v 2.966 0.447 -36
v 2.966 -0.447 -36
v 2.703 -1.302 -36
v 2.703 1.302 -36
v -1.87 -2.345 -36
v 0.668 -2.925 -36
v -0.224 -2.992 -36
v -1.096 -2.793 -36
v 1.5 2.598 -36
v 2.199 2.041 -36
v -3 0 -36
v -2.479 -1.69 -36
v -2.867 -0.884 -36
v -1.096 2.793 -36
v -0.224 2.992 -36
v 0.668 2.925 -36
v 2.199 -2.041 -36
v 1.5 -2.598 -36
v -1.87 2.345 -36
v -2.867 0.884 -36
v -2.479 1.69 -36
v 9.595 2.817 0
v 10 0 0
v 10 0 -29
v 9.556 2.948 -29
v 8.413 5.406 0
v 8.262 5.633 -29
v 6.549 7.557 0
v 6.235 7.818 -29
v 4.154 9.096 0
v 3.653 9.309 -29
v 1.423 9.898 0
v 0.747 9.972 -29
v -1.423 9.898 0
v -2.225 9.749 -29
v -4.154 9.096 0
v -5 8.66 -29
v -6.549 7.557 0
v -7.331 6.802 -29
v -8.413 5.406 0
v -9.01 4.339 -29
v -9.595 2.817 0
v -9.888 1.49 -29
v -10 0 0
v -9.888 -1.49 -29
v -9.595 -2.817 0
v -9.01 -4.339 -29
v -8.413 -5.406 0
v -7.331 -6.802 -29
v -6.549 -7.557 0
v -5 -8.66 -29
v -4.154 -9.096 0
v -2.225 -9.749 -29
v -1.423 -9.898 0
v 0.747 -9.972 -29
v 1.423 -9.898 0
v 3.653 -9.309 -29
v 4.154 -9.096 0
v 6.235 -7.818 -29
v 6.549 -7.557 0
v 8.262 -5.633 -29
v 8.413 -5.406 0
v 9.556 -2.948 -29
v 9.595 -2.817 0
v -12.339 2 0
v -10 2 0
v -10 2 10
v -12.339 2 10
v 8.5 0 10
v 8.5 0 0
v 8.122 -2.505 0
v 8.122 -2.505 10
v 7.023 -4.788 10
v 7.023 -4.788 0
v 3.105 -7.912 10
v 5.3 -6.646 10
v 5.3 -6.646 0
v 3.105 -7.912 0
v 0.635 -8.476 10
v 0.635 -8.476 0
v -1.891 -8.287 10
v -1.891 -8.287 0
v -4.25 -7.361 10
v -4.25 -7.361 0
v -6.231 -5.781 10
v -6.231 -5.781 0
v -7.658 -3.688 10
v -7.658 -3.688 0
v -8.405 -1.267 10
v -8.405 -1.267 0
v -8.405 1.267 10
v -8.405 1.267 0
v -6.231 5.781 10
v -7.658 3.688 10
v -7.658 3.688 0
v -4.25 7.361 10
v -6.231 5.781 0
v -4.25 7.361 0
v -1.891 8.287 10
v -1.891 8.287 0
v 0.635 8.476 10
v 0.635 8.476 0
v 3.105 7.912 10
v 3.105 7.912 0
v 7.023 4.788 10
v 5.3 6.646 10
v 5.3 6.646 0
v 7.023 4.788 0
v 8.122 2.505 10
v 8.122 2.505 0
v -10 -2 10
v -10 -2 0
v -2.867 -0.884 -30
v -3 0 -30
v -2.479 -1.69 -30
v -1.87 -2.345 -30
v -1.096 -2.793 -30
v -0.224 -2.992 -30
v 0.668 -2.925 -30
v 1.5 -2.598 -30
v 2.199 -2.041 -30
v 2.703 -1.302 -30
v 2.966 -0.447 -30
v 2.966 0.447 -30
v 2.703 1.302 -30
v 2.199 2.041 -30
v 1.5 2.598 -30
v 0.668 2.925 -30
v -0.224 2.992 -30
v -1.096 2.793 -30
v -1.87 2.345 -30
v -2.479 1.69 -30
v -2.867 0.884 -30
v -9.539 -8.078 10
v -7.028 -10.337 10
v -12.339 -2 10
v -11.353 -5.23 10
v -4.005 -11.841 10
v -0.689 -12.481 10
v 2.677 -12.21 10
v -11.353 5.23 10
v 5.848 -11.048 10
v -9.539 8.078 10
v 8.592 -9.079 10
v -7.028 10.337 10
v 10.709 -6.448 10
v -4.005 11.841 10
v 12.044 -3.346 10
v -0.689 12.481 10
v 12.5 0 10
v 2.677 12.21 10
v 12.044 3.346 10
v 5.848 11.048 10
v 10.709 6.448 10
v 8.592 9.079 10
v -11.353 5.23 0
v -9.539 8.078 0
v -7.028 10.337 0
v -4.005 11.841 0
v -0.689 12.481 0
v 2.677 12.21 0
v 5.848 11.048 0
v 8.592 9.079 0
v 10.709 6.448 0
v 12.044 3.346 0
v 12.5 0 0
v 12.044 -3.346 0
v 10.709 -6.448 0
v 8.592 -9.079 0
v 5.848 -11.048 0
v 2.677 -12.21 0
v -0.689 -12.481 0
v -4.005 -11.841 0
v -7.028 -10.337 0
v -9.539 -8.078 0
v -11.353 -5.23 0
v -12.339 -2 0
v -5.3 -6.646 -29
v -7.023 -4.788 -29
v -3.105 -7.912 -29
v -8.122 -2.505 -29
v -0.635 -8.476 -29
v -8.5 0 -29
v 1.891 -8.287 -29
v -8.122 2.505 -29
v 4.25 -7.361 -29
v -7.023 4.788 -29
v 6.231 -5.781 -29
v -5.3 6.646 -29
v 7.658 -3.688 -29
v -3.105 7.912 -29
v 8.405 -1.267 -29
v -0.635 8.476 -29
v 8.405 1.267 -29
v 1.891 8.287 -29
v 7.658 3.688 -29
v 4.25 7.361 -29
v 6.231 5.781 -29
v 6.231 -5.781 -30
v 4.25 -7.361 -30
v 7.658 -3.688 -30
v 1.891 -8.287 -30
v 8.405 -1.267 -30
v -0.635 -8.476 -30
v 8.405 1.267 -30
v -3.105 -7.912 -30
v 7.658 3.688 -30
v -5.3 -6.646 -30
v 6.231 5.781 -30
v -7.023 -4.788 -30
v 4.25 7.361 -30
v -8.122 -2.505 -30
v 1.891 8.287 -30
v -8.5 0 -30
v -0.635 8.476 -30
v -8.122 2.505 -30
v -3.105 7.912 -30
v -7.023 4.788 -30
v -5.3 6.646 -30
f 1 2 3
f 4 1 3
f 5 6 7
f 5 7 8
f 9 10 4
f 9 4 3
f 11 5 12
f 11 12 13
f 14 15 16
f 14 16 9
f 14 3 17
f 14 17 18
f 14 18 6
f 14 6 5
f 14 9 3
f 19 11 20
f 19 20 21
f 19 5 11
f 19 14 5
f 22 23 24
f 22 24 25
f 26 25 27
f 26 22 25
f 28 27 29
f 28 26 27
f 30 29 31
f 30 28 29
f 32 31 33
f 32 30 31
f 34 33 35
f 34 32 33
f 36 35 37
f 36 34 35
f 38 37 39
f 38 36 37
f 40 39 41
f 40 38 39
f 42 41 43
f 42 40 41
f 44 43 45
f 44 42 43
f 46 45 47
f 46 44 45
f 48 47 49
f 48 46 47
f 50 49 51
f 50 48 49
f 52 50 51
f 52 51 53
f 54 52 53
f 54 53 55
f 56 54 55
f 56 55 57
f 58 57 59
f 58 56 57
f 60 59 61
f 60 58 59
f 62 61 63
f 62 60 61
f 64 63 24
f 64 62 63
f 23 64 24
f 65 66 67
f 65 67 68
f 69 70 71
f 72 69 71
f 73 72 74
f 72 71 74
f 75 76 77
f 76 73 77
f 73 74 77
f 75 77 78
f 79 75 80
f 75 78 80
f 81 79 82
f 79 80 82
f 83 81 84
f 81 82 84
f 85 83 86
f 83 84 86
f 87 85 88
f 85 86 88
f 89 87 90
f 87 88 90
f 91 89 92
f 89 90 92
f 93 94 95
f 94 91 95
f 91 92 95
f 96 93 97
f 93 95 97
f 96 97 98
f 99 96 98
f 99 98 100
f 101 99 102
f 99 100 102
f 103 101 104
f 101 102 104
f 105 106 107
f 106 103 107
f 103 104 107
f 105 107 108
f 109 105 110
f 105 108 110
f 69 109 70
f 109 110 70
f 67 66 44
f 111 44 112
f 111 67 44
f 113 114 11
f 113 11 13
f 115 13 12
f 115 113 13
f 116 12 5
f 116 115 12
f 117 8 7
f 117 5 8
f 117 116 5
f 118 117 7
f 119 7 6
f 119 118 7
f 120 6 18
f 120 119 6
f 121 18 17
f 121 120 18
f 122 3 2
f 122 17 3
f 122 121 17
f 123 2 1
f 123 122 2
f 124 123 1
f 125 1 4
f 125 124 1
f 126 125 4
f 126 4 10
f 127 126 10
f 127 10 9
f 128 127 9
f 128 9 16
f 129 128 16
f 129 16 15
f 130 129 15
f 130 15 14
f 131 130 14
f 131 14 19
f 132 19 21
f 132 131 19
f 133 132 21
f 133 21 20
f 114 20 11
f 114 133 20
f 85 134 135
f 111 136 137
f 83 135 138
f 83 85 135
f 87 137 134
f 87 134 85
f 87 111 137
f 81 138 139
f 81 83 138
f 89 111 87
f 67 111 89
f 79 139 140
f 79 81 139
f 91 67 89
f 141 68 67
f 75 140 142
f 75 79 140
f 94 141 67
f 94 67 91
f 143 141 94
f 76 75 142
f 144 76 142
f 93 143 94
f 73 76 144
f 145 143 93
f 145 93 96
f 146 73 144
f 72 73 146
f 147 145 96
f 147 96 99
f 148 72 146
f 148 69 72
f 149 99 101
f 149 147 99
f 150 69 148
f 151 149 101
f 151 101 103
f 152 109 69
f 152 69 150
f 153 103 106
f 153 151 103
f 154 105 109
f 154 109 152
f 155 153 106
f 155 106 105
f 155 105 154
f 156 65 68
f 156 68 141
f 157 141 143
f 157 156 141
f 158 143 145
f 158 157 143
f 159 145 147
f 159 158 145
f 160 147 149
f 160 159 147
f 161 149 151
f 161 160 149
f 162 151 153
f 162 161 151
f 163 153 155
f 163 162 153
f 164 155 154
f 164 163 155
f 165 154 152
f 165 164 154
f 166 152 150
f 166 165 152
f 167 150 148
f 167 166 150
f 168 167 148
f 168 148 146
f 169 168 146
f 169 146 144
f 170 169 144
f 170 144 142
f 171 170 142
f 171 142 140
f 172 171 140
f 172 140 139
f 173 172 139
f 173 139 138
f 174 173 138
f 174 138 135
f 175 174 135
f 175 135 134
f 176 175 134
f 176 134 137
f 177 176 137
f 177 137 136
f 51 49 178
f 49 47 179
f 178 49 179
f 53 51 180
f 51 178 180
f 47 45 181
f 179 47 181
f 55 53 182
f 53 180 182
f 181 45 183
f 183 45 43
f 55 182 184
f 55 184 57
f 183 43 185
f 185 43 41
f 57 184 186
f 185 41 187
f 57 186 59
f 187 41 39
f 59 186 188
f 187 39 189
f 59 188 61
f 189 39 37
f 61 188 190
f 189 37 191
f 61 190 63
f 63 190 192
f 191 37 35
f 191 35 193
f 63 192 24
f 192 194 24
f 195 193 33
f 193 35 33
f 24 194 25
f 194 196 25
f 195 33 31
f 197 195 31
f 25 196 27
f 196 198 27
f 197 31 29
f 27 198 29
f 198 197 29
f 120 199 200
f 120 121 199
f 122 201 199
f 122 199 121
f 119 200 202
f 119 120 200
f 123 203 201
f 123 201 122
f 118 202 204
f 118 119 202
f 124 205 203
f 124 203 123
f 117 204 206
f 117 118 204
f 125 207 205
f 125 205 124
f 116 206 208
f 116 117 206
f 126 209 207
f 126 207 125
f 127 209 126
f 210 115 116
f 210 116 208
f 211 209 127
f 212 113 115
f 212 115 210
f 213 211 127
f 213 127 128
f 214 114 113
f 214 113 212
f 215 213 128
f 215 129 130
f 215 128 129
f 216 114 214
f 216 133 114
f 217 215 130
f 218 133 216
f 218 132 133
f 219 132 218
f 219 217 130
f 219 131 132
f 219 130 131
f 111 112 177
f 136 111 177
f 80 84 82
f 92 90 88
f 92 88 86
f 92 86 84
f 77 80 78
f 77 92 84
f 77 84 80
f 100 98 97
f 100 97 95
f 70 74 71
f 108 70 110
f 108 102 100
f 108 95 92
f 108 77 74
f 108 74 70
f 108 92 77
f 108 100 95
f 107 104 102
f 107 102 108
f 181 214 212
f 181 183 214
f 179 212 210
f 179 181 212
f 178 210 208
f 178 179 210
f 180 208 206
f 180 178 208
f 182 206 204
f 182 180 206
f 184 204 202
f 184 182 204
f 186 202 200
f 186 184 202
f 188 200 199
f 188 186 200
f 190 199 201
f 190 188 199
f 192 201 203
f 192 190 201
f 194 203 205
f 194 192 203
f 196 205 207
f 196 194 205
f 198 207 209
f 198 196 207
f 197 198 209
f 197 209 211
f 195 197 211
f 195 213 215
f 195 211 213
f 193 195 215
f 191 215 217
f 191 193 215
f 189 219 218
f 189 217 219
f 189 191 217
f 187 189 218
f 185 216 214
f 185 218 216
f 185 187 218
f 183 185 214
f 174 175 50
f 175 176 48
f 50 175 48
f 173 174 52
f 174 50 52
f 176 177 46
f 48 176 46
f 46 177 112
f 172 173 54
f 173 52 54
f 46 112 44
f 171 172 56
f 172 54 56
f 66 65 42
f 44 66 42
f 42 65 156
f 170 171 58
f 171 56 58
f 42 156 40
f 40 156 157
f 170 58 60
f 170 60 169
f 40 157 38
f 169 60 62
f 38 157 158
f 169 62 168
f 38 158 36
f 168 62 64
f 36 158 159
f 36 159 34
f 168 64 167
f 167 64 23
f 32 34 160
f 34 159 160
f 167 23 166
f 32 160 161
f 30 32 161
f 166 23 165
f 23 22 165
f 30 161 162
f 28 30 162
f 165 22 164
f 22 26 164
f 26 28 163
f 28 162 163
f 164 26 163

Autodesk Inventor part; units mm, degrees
ref_plane "YZ Plane" through (0, 0, 0) normal (1, 0, 0) x (0, 1, 0)
ref_plane "XZ Plane" through (0, 0, 0) normal (0, 1, 0) x (-1, 0, 0)
ref_plane "XY Plane" through (0, 0, 0) normal (0, 0, 1) x (1, 0, 0)
sketch "Sketch1" plane through (0, 0, 0) normal (0, 0, 1) x (1, 0, 0)
  circle A0 centre (0, 0) radius 10
  circle A1 centre (0, 0) radius 12.5
  dimension "d0" = 0
  dimension "d1" = 0
  dimension "d2" = 0
  dimension "d3" = 0
  dimension "d4" = 25
  dimension "d5" = 20
extrude "Extrusion1" add sketch "Sketch1" along normal blind 10
extrude "Extrusion2" add sketch "Sketch1" against normal blind 29 contours A0
sketch "Sketch2" plane through (0, 0, -29) normal (0, 0, -1) x (-1, 0, 0)
  circle A0 centre (0, 0) radius 8.5
  dimension "d10" = 17
extrude "Extrusion3" add sketch "Sketch2" along normal blind 1
sketch "Sketch3" plane through (0, 0, -30) normal (0, 0, -1) x (-1, 0, 0)
  circle A0 centre (0, 0) radius 3
  dimension "d13" = 6
extrude "Extrusion4" add sketch "Sketch3" along normal blind 6
thread "Thread1" size "M6x1" class "6g" standard "ANSI Metric M Profile" full length
sketch "Sketch4" plane through (0, 0, 10) normal (0, 0, 1) x (1, 0, 0)
  circle A0 centre (0, 0) radius 10 projected
  line L0 (-10, 0) -> (-10, 2)
  line L1 (-10, 2) -> (-12.8956, 2)
  line L2 (-10, 0) -> (-11.1456, 0)
  line L3 (-10, 0) -> (-10, -2)
  line L4 (-10, -2) -> (-12.8956, -2)
  line L5 (-12.8956, -2) -> (-12.8956, 2)
extrude "Extrusion5" cut sketch "Sketch4" against normal up to surface (10 mm away) contours L3 L4 L5 L1 L0
sketch "Sketch5" plane through (0, 0, 0) normal (0, 0, 1) x (1, 0, 0)
  circle A0 centre (0, 0) radius 10
  circle A1 centre (0, 0) radius 8.5
  point P0 (-10, 0)
extrude "Extrusion6" add sketch "Sketch5" along normal blind 10
properties part number "piraki"
